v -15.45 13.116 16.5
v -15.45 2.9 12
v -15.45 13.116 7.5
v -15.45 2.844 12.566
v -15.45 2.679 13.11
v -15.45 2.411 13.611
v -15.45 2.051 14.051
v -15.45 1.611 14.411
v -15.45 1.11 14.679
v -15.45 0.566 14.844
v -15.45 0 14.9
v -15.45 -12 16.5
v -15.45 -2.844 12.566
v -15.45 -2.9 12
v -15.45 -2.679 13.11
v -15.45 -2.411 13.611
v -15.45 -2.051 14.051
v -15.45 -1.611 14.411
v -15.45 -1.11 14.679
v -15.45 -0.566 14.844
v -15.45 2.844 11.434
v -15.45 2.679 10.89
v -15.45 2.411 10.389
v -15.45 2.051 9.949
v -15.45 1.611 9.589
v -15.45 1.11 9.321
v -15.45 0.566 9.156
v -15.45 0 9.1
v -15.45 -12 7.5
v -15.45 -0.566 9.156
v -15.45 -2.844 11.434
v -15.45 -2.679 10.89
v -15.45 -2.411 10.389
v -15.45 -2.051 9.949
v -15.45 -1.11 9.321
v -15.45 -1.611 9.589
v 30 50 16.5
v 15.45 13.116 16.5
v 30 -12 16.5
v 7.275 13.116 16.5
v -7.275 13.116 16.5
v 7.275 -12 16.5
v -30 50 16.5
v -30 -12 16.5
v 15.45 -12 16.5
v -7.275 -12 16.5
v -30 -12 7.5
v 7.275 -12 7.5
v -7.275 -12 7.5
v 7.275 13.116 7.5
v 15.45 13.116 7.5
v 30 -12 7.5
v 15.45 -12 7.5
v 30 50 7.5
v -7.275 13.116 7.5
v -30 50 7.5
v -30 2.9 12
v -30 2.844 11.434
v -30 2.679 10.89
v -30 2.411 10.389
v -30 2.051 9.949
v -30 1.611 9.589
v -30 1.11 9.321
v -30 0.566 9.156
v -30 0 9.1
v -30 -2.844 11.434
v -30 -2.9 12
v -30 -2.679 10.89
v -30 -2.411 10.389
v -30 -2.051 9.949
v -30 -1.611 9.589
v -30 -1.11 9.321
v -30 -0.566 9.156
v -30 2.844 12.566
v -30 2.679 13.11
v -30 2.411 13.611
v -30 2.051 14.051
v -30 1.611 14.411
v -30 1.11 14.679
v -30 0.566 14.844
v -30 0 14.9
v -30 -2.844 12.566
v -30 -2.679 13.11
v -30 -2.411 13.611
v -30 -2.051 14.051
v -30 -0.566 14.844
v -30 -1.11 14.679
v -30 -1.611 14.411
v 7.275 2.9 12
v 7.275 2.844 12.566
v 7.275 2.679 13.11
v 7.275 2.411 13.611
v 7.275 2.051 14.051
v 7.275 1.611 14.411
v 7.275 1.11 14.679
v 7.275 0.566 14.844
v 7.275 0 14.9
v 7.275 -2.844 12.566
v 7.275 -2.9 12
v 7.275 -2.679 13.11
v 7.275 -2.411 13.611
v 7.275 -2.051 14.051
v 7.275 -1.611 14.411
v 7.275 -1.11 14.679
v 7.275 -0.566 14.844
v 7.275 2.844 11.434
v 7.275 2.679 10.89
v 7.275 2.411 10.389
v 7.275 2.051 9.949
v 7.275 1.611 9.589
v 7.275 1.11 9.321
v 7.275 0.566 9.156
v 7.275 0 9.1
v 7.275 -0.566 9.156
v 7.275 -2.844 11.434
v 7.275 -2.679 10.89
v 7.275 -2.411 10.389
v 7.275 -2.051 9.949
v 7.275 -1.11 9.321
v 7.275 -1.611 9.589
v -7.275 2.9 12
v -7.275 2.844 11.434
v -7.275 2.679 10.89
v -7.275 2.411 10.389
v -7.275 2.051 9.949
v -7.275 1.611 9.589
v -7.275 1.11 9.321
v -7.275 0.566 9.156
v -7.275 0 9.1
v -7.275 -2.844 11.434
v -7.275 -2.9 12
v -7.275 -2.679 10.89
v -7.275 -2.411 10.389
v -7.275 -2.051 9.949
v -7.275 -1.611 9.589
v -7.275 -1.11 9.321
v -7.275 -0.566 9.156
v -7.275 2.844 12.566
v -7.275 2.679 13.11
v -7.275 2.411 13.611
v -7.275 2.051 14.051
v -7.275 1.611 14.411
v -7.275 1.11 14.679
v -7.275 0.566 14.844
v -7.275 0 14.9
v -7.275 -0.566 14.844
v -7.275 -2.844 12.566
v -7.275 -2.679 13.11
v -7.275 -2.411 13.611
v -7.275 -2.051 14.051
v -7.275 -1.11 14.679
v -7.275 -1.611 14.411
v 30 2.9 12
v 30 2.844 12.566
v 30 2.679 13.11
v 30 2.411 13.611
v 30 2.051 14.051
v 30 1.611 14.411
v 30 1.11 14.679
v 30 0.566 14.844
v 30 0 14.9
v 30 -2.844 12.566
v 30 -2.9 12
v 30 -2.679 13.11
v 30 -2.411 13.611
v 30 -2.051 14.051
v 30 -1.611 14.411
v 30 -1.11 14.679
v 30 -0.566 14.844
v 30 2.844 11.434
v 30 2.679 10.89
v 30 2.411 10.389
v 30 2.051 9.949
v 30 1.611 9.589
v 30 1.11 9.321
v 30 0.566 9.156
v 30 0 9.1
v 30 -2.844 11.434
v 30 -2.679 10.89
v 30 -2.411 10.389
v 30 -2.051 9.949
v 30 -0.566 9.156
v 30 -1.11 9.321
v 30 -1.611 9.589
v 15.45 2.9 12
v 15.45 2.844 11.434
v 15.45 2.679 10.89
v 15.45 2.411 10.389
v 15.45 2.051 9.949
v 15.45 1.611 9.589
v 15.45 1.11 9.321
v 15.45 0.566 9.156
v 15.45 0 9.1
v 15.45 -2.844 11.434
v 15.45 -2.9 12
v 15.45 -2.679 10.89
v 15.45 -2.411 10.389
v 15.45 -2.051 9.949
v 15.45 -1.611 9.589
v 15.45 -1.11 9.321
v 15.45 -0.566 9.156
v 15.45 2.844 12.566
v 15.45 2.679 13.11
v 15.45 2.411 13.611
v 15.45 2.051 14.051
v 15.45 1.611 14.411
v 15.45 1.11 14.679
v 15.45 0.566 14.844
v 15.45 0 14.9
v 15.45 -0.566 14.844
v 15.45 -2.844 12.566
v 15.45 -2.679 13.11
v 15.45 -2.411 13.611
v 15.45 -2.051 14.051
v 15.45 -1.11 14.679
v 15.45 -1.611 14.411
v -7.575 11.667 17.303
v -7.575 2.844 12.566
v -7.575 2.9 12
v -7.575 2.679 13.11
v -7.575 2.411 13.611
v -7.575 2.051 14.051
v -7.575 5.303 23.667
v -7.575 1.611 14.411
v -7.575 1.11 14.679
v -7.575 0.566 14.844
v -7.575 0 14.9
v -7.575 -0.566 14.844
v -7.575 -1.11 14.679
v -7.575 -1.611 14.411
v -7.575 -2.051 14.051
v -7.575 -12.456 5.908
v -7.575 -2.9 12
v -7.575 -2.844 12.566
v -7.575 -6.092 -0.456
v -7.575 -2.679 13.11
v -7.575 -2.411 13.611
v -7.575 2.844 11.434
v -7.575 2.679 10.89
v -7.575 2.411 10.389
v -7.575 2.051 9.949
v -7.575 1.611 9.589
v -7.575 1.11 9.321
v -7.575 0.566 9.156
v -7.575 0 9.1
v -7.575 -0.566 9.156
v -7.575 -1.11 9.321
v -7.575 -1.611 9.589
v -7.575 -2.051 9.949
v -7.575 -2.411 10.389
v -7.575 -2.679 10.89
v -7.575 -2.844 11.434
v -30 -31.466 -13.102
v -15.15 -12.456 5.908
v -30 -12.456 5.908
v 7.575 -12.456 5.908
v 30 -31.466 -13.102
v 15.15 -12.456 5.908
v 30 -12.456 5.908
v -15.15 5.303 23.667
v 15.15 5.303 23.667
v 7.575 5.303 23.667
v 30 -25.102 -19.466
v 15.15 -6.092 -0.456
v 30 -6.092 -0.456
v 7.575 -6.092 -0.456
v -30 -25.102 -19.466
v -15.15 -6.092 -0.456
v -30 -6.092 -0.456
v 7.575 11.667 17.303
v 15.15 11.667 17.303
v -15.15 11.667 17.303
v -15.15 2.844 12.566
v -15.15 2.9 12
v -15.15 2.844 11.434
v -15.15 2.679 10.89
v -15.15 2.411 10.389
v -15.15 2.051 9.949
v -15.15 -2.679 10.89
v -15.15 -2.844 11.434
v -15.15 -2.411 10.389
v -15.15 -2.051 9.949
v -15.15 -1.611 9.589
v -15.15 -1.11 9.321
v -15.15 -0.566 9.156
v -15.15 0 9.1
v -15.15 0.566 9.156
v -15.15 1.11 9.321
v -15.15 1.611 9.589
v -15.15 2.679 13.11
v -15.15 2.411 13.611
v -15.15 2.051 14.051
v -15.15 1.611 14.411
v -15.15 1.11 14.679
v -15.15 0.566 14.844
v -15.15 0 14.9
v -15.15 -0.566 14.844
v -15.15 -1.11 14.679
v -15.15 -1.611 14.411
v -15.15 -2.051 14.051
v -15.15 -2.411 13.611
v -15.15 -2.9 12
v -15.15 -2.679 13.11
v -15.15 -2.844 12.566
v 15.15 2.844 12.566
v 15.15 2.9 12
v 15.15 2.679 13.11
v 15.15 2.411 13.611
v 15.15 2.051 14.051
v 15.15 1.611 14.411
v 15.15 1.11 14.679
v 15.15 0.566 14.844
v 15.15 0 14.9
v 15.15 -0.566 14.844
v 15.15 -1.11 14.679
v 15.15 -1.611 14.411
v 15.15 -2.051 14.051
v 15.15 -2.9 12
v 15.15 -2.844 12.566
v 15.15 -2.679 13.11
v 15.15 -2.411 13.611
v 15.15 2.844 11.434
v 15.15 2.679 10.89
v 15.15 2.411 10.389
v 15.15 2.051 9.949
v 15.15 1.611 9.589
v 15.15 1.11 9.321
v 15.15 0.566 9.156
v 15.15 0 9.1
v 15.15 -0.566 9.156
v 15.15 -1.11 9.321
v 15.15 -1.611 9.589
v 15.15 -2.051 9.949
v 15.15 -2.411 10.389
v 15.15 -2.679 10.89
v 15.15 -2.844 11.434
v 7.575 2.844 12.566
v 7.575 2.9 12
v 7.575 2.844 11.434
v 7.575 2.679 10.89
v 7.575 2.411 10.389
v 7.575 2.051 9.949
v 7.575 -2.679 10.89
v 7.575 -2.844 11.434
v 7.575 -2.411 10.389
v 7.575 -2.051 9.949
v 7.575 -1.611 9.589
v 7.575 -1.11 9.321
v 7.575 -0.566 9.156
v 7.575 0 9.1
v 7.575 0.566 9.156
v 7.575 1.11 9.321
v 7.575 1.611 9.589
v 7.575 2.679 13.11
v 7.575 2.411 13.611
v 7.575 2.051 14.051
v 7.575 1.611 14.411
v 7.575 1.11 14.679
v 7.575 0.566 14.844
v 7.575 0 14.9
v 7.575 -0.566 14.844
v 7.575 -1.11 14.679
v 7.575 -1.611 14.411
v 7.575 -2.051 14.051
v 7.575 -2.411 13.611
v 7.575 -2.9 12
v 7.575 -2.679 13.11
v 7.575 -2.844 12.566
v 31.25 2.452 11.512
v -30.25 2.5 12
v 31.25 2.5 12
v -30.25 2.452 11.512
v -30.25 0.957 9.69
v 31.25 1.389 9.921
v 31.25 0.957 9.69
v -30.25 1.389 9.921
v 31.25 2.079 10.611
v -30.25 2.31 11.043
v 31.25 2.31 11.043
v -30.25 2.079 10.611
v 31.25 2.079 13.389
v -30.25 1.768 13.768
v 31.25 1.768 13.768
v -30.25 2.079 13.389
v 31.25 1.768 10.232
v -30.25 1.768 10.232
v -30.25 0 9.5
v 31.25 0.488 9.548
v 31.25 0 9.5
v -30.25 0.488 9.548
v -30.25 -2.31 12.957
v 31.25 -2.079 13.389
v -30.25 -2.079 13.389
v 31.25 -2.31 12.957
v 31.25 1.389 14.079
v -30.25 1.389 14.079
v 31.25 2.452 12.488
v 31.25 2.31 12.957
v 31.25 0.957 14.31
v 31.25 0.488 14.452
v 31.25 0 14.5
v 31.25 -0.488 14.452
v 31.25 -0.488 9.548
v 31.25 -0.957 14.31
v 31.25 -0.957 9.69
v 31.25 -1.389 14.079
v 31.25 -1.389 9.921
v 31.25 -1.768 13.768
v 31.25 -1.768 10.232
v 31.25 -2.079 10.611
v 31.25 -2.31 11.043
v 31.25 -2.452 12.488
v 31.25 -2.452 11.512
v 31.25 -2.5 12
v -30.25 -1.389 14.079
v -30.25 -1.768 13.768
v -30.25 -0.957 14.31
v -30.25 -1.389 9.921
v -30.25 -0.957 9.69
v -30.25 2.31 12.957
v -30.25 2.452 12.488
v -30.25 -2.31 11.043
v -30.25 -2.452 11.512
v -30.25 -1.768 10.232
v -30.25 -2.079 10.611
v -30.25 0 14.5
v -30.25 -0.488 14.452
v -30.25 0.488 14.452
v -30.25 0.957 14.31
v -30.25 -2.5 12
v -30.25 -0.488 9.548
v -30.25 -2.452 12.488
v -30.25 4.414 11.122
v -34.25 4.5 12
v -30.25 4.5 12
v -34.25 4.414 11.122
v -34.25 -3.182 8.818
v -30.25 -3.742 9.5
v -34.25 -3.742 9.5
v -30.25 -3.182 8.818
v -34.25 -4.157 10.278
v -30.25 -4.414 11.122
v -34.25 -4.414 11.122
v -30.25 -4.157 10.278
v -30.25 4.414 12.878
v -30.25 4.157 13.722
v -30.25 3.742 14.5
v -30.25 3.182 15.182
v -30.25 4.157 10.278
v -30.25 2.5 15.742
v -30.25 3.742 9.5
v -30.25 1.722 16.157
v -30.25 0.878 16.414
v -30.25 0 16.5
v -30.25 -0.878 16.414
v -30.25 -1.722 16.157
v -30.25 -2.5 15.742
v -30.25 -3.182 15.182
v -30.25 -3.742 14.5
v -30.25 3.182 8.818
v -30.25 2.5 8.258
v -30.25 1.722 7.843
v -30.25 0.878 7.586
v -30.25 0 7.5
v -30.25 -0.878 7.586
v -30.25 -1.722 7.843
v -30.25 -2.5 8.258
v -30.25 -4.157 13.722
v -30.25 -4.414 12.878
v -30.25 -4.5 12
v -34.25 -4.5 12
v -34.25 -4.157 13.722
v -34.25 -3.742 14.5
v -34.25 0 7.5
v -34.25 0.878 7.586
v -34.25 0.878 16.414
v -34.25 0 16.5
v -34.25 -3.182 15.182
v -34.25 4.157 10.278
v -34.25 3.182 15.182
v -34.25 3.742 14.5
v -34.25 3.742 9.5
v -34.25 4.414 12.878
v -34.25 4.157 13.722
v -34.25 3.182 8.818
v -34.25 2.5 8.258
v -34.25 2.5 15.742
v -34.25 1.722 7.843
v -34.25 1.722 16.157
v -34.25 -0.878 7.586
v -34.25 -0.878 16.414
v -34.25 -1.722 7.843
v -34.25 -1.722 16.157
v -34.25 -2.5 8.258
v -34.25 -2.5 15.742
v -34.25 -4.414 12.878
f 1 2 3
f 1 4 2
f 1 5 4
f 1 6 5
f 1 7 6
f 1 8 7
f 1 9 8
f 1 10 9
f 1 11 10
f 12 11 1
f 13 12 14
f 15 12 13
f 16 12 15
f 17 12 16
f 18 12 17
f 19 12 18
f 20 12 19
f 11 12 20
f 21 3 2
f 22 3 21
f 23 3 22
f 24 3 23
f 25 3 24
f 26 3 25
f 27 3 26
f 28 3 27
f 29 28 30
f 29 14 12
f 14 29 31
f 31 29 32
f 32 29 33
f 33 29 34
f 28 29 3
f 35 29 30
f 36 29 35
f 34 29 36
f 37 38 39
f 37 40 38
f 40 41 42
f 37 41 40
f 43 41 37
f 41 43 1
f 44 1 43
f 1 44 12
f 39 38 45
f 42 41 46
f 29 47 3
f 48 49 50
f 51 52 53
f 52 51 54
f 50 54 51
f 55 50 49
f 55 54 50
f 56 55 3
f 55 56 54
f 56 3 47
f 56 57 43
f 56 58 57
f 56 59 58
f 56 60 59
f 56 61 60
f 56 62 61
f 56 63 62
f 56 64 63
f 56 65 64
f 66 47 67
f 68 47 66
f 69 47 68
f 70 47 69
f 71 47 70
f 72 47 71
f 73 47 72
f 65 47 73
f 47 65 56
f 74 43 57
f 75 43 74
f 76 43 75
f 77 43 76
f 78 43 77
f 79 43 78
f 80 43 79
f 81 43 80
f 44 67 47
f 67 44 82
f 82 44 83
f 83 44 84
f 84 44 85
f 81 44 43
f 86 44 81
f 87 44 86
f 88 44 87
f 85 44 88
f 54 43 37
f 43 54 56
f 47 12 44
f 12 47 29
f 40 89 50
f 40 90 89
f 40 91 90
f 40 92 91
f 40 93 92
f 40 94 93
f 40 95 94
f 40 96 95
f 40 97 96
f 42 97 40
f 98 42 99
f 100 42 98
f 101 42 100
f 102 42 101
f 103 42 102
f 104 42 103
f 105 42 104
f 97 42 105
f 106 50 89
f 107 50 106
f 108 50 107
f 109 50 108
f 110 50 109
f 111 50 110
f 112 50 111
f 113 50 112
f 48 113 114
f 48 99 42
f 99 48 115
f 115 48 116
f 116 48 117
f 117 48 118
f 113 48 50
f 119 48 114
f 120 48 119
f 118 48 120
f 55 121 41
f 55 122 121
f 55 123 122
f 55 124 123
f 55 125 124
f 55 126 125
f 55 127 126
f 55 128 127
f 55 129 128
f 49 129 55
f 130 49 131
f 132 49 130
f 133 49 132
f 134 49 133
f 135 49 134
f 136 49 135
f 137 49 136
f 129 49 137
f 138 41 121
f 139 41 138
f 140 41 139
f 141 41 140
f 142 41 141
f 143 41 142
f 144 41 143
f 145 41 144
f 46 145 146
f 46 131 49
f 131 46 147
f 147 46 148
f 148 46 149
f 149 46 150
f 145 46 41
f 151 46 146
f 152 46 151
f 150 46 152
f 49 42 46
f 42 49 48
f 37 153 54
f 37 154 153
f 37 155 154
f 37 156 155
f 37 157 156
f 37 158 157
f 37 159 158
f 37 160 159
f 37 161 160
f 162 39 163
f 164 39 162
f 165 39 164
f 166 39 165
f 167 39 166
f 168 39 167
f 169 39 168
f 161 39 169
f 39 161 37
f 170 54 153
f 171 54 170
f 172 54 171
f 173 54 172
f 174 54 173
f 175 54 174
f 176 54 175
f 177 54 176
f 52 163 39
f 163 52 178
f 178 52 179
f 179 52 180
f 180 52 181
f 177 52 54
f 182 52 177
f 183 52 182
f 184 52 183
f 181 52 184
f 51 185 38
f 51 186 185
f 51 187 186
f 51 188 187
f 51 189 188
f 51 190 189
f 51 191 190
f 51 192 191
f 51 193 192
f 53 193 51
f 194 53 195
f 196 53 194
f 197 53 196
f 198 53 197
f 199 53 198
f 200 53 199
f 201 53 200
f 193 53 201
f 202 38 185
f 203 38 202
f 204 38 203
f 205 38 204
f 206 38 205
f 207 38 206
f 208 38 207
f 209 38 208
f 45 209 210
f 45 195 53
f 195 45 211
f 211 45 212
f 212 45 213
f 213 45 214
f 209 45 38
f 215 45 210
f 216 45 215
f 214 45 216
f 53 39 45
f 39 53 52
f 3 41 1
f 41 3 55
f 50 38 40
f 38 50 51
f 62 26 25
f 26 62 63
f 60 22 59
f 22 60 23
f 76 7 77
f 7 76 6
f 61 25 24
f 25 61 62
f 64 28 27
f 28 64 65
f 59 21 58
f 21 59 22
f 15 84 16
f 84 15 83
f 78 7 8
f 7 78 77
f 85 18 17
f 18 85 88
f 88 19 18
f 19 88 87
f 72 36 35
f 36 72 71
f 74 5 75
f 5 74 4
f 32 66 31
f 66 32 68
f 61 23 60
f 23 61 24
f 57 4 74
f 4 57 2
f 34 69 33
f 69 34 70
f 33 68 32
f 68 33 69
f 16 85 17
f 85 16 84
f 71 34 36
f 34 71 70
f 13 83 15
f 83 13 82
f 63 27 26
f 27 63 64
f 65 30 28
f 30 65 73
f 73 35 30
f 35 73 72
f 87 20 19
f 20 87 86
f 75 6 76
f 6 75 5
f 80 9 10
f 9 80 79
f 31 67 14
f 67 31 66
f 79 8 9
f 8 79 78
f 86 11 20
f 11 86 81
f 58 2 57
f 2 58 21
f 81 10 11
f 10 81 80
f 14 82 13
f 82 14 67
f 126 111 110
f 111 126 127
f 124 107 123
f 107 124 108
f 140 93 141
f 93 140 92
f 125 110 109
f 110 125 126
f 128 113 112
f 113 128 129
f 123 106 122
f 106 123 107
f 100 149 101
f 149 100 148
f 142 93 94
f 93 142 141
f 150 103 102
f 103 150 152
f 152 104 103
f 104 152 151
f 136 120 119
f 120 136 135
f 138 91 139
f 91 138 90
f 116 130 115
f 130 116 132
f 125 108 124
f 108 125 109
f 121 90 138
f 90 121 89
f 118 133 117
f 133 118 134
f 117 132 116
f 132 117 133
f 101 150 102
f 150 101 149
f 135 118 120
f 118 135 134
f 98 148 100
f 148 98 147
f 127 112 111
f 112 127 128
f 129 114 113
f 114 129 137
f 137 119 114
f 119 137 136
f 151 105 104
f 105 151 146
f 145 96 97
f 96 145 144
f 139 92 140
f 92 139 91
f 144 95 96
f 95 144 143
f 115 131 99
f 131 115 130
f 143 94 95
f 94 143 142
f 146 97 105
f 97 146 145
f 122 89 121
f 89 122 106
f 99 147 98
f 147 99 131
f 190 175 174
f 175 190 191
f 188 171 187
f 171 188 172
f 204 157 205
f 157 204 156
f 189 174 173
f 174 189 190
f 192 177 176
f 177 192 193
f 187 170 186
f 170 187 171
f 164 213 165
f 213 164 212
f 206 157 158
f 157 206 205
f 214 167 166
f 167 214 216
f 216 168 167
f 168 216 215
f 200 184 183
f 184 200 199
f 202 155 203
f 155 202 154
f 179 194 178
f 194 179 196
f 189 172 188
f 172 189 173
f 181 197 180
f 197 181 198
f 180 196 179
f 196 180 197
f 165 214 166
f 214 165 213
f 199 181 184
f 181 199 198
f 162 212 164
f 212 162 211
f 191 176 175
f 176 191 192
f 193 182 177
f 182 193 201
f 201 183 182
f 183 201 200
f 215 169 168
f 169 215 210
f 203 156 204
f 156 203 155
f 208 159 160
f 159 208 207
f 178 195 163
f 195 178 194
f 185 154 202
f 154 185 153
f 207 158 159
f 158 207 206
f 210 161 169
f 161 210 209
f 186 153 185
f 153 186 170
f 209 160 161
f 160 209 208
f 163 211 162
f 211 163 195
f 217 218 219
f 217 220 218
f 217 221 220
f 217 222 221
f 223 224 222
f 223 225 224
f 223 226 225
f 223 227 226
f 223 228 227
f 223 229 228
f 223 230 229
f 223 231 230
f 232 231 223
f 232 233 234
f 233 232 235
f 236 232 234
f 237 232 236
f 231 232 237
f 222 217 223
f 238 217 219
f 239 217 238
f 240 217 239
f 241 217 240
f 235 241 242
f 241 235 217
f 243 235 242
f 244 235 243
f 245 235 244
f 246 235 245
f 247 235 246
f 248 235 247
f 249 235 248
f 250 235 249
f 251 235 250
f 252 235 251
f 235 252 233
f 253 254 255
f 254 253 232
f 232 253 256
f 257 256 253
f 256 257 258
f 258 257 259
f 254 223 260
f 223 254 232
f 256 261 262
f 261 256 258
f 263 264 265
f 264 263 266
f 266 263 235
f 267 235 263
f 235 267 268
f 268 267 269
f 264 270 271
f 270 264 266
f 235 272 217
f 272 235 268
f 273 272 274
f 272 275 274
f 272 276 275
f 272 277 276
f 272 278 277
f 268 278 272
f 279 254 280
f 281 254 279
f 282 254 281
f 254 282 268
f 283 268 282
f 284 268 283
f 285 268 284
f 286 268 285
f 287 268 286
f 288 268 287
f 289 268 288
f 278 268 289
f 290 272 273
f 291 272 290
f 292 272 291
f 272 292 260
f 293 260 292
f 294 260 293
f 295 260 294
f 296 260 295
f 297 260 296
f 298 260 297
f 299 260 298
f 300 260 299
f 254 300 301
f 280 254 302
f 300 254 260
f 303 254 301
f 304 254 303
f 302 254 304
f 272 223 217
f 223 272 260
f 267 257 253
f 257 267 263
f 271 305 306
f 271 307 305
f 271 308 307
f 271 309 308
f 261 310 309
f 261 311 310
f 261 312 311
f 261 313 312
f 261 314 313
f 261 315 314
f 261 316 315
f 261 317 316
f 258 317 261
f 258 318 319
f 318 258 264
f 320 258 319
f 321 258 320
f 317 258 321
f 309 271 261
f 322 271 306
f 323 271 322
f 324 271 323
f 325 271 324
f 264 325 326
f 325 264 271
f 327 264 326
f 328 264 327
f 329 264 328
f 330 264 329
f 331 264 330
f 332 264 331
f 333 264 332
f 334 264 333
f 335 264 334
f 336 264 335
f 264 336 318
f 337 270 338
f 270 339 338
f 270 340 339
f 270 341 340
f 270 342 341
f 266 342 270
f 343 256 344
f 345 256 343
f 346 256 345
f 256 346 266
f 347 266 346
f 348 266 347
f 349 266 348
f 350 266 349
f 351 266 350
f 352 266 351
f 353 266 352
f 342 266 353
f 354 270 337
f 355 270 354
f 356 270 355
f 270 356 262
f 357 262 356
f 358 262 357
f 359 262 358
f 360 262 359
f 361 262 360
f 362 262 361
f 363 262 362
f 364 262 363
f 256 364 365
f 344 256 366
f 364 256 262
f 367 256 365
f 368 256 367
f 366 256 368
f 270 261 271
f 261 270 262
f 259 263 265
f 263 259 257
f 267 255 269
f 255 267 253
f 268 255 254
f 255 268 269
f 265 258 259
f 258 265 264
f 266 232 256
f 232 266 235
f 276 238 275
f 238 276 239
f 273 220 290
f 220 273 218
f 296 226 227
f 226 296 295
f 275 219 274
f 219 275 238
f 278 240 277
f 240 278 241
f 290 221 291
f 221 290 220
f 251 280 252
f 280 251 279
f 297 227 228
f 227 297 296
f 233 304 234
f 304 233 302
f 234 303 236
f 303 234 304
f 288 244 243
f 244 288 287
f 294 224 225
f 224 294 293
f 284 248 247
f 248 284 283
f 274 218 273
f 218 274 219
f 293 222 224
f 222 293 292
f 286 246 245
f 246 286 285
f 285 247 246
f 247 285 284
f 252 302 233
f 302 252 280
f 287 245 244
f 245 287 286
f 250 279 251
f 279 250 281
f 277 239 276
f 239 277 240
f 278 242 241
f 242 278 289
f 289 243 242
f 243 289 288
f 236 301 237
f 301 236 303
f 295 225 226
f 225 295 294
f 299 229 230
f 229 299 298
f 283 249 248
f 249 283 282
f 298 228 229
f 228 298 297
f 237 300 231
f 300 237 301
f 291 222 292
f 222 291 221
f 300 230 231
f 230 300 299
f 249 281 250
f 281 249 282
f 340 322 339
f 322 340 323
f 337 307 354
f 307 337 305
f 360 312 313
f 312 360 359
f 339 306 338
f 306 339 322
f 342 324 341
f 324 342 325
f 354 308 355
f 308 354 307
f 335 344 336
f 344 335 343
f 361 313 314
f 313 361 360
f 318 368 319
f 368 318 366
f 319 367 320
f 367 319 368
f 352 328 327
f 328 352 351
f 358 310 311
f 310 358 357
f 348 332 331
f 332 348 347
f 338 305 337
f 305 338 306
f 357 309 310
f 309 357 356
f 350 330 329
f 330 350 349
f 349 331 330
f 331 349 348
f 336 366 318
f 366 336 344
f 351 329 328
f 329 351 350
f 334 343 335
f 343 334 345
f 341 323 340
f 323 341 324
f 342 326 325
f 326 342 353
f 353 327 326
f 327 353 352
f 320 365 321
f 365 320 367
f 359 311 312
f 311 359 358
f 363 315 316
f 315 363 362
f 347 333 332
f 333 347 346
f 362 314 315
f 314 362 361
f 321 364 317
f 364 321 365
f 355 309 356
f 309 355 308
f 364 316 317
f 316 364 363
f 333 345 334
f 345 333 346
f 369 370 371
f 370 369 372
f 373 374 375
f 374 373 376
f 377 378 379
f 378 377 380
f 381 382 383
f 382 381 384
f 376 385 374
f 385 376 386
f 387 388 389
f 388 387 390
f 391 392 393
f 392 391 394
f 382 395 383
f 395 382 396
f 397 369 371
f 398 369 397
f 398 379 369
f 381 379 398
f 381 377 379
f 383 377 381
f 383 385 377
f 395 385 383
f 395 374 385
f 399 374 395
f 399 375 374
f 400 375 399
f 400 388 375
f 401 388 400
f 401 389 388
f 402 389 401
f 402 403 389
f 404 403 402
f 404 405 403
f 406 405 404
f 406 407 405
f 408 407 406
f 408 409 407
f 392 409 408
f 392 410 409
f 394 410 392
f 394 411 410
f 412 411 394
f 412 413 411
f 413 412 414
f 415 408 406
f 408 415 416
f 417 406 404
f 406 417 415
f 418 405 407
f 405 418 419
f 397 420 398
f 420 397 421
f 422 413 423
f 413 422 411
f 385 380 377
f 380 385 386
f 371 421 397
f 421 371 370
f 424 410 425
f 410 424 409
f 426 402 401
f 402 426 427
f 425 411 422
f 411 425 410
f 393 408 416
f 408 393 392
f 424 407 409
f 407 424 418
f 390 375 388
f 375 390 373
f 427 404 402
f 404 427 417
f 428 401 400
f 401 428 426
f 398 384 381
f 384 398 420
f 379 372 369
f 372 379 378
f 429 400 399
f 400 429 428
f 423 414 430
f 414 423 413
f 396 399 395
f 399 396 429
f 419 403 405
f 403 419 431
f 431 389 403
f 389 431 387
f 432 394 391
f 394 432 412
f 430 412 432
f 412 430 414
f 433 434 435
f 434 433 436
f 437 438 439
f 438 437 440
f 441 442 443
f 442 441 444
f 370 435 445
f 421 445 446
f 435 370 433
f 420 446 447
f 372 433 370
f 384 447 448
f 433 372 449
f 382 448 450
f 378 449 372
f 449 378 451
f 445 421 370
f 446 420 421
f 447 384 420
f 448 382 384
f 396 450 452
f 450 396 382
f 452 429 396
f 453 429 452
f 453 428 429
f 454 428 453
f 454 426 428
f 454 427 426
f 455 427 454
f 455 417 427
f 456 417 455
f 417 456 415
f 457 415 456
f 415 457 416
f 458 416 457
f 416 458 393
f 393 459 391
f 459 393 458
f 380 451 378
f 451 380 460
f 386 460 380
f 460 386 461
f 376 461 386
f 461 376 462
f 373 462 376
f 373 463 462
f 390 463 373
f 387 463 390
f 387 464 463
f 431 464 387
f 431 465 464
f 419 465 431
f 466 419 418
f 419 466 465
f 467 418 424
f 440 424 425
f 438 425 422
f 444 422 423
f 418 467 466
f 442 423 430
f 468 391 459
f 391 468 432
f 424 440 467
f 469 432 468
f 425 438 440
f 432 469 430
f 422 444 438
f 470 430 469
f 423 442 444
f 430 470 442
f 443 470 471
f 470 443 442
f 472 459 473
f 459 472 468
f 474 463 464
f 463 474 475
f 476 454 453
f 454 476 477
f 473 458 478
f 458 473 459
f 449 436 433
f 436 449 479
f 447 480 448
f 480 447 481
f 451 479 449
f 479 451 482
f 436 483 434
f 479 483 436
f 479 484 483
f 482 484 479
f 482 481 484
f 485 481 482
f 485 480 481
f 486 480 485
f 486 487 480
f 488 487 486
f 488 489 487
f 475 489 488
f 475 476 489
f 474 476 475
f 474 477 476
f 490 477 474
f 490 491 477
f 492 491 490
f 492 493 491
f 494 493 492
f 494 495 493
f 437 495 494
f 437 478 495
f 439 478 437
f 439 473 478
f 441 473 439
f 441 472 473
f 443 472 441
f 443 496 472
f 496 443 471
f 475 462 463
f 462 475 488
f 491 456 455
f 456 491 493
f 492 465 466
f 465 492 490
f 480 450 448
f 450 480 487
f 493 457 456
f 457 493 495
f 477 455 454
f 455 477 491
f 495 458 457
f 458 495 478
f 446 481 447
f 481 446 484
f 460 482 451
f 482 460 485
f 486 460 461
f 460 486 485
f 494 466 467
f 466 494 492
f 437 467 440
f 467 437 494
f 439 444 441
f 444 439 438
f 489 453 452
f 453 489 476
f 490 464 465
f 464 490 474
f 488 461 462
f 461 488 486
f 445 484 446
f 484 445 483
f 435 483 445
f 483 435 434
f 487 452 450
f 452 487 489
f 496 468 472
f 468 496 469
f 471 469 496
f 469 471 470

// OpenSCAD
$fn = 32;

// ------------------------------------------------------------------------
// Butt hinge: hinge 60 mm, leaf swung 45 deg
// Every part is its own module, assembly() places every instance.
// ------------------------------------------------------------------------

// --- part 1 ---
module hinge_base() {
  difference() {
    union() {
      translate([-30, -12, -4.5]) cube([14.55, 62, 9]);
      translate([-7.275, -12, -4.5]) cube([14.55, 62, 9]);
      translate([15.45, -12, -4.5]) cube([14.55, 62, 9]);
      translate([-30, 13.116, -4.5]) cube([60, 36.884, 9]);
    }
    translate([-22.725, 0, 0]) rotate([0, 90, 0]) cylinder(h = 16.55, d = 5.8, center = true);
    translate([0, 0, 0]) rotate([0, 90, 0]) cylinder(h = 16.55, d = 5.8, center = true);
    translate([22.725, 0, 0]) rotate([0, 90, 0]) cylinder(h = 16.55, d = 5.8, center = true);
  }
}

// --- part 2 ---
module hinge_mover() {
  difference() {
    union() {
      translate([-15.15, -40, -4.5]) cube([7.575, 52, 9]);
      translate([7.575, -40, -4.5]) cube([7.575, 52, 9]);
      translate([-30, -40, -4.5]) cube([60, 26.884, 9]);
    }
    translate([-11.362, 0, 0]) rotate([0, 90, 0]) cylinder(h = 9.575, d = 5.8, center = true);
    translate([11.362, 0, 0]) rotate([0, 90, 0]) cylinder(h = 9.575, d = 5.8, center = true);
  }
}

// --- part 3 ---
module hinge_pin() {
  rotate([0, 90, 0]) cylinder(h = 62.5, d = 5, center = true);
  translate([-34.25, 0, 0]) rotate([0, 90, 0]) cylinder(h = 4, d = 9);
}

// --- assembly ---
module assembly() {
  color([0.80, 0.24, 0.20]) translate([0, 0, 12]) rotate([0, 0, 0]) hinge_base();
  color([0.20, 0.45, 0.75]) translate([0, 0, 12]) rotate([45, 0, 0]) hinge_mover();
  color([0.25, 0.62, 0.32]) translate([0, 0, 12]) rotate([0, 0, 0]) hinge_pin();
}

assembly();
